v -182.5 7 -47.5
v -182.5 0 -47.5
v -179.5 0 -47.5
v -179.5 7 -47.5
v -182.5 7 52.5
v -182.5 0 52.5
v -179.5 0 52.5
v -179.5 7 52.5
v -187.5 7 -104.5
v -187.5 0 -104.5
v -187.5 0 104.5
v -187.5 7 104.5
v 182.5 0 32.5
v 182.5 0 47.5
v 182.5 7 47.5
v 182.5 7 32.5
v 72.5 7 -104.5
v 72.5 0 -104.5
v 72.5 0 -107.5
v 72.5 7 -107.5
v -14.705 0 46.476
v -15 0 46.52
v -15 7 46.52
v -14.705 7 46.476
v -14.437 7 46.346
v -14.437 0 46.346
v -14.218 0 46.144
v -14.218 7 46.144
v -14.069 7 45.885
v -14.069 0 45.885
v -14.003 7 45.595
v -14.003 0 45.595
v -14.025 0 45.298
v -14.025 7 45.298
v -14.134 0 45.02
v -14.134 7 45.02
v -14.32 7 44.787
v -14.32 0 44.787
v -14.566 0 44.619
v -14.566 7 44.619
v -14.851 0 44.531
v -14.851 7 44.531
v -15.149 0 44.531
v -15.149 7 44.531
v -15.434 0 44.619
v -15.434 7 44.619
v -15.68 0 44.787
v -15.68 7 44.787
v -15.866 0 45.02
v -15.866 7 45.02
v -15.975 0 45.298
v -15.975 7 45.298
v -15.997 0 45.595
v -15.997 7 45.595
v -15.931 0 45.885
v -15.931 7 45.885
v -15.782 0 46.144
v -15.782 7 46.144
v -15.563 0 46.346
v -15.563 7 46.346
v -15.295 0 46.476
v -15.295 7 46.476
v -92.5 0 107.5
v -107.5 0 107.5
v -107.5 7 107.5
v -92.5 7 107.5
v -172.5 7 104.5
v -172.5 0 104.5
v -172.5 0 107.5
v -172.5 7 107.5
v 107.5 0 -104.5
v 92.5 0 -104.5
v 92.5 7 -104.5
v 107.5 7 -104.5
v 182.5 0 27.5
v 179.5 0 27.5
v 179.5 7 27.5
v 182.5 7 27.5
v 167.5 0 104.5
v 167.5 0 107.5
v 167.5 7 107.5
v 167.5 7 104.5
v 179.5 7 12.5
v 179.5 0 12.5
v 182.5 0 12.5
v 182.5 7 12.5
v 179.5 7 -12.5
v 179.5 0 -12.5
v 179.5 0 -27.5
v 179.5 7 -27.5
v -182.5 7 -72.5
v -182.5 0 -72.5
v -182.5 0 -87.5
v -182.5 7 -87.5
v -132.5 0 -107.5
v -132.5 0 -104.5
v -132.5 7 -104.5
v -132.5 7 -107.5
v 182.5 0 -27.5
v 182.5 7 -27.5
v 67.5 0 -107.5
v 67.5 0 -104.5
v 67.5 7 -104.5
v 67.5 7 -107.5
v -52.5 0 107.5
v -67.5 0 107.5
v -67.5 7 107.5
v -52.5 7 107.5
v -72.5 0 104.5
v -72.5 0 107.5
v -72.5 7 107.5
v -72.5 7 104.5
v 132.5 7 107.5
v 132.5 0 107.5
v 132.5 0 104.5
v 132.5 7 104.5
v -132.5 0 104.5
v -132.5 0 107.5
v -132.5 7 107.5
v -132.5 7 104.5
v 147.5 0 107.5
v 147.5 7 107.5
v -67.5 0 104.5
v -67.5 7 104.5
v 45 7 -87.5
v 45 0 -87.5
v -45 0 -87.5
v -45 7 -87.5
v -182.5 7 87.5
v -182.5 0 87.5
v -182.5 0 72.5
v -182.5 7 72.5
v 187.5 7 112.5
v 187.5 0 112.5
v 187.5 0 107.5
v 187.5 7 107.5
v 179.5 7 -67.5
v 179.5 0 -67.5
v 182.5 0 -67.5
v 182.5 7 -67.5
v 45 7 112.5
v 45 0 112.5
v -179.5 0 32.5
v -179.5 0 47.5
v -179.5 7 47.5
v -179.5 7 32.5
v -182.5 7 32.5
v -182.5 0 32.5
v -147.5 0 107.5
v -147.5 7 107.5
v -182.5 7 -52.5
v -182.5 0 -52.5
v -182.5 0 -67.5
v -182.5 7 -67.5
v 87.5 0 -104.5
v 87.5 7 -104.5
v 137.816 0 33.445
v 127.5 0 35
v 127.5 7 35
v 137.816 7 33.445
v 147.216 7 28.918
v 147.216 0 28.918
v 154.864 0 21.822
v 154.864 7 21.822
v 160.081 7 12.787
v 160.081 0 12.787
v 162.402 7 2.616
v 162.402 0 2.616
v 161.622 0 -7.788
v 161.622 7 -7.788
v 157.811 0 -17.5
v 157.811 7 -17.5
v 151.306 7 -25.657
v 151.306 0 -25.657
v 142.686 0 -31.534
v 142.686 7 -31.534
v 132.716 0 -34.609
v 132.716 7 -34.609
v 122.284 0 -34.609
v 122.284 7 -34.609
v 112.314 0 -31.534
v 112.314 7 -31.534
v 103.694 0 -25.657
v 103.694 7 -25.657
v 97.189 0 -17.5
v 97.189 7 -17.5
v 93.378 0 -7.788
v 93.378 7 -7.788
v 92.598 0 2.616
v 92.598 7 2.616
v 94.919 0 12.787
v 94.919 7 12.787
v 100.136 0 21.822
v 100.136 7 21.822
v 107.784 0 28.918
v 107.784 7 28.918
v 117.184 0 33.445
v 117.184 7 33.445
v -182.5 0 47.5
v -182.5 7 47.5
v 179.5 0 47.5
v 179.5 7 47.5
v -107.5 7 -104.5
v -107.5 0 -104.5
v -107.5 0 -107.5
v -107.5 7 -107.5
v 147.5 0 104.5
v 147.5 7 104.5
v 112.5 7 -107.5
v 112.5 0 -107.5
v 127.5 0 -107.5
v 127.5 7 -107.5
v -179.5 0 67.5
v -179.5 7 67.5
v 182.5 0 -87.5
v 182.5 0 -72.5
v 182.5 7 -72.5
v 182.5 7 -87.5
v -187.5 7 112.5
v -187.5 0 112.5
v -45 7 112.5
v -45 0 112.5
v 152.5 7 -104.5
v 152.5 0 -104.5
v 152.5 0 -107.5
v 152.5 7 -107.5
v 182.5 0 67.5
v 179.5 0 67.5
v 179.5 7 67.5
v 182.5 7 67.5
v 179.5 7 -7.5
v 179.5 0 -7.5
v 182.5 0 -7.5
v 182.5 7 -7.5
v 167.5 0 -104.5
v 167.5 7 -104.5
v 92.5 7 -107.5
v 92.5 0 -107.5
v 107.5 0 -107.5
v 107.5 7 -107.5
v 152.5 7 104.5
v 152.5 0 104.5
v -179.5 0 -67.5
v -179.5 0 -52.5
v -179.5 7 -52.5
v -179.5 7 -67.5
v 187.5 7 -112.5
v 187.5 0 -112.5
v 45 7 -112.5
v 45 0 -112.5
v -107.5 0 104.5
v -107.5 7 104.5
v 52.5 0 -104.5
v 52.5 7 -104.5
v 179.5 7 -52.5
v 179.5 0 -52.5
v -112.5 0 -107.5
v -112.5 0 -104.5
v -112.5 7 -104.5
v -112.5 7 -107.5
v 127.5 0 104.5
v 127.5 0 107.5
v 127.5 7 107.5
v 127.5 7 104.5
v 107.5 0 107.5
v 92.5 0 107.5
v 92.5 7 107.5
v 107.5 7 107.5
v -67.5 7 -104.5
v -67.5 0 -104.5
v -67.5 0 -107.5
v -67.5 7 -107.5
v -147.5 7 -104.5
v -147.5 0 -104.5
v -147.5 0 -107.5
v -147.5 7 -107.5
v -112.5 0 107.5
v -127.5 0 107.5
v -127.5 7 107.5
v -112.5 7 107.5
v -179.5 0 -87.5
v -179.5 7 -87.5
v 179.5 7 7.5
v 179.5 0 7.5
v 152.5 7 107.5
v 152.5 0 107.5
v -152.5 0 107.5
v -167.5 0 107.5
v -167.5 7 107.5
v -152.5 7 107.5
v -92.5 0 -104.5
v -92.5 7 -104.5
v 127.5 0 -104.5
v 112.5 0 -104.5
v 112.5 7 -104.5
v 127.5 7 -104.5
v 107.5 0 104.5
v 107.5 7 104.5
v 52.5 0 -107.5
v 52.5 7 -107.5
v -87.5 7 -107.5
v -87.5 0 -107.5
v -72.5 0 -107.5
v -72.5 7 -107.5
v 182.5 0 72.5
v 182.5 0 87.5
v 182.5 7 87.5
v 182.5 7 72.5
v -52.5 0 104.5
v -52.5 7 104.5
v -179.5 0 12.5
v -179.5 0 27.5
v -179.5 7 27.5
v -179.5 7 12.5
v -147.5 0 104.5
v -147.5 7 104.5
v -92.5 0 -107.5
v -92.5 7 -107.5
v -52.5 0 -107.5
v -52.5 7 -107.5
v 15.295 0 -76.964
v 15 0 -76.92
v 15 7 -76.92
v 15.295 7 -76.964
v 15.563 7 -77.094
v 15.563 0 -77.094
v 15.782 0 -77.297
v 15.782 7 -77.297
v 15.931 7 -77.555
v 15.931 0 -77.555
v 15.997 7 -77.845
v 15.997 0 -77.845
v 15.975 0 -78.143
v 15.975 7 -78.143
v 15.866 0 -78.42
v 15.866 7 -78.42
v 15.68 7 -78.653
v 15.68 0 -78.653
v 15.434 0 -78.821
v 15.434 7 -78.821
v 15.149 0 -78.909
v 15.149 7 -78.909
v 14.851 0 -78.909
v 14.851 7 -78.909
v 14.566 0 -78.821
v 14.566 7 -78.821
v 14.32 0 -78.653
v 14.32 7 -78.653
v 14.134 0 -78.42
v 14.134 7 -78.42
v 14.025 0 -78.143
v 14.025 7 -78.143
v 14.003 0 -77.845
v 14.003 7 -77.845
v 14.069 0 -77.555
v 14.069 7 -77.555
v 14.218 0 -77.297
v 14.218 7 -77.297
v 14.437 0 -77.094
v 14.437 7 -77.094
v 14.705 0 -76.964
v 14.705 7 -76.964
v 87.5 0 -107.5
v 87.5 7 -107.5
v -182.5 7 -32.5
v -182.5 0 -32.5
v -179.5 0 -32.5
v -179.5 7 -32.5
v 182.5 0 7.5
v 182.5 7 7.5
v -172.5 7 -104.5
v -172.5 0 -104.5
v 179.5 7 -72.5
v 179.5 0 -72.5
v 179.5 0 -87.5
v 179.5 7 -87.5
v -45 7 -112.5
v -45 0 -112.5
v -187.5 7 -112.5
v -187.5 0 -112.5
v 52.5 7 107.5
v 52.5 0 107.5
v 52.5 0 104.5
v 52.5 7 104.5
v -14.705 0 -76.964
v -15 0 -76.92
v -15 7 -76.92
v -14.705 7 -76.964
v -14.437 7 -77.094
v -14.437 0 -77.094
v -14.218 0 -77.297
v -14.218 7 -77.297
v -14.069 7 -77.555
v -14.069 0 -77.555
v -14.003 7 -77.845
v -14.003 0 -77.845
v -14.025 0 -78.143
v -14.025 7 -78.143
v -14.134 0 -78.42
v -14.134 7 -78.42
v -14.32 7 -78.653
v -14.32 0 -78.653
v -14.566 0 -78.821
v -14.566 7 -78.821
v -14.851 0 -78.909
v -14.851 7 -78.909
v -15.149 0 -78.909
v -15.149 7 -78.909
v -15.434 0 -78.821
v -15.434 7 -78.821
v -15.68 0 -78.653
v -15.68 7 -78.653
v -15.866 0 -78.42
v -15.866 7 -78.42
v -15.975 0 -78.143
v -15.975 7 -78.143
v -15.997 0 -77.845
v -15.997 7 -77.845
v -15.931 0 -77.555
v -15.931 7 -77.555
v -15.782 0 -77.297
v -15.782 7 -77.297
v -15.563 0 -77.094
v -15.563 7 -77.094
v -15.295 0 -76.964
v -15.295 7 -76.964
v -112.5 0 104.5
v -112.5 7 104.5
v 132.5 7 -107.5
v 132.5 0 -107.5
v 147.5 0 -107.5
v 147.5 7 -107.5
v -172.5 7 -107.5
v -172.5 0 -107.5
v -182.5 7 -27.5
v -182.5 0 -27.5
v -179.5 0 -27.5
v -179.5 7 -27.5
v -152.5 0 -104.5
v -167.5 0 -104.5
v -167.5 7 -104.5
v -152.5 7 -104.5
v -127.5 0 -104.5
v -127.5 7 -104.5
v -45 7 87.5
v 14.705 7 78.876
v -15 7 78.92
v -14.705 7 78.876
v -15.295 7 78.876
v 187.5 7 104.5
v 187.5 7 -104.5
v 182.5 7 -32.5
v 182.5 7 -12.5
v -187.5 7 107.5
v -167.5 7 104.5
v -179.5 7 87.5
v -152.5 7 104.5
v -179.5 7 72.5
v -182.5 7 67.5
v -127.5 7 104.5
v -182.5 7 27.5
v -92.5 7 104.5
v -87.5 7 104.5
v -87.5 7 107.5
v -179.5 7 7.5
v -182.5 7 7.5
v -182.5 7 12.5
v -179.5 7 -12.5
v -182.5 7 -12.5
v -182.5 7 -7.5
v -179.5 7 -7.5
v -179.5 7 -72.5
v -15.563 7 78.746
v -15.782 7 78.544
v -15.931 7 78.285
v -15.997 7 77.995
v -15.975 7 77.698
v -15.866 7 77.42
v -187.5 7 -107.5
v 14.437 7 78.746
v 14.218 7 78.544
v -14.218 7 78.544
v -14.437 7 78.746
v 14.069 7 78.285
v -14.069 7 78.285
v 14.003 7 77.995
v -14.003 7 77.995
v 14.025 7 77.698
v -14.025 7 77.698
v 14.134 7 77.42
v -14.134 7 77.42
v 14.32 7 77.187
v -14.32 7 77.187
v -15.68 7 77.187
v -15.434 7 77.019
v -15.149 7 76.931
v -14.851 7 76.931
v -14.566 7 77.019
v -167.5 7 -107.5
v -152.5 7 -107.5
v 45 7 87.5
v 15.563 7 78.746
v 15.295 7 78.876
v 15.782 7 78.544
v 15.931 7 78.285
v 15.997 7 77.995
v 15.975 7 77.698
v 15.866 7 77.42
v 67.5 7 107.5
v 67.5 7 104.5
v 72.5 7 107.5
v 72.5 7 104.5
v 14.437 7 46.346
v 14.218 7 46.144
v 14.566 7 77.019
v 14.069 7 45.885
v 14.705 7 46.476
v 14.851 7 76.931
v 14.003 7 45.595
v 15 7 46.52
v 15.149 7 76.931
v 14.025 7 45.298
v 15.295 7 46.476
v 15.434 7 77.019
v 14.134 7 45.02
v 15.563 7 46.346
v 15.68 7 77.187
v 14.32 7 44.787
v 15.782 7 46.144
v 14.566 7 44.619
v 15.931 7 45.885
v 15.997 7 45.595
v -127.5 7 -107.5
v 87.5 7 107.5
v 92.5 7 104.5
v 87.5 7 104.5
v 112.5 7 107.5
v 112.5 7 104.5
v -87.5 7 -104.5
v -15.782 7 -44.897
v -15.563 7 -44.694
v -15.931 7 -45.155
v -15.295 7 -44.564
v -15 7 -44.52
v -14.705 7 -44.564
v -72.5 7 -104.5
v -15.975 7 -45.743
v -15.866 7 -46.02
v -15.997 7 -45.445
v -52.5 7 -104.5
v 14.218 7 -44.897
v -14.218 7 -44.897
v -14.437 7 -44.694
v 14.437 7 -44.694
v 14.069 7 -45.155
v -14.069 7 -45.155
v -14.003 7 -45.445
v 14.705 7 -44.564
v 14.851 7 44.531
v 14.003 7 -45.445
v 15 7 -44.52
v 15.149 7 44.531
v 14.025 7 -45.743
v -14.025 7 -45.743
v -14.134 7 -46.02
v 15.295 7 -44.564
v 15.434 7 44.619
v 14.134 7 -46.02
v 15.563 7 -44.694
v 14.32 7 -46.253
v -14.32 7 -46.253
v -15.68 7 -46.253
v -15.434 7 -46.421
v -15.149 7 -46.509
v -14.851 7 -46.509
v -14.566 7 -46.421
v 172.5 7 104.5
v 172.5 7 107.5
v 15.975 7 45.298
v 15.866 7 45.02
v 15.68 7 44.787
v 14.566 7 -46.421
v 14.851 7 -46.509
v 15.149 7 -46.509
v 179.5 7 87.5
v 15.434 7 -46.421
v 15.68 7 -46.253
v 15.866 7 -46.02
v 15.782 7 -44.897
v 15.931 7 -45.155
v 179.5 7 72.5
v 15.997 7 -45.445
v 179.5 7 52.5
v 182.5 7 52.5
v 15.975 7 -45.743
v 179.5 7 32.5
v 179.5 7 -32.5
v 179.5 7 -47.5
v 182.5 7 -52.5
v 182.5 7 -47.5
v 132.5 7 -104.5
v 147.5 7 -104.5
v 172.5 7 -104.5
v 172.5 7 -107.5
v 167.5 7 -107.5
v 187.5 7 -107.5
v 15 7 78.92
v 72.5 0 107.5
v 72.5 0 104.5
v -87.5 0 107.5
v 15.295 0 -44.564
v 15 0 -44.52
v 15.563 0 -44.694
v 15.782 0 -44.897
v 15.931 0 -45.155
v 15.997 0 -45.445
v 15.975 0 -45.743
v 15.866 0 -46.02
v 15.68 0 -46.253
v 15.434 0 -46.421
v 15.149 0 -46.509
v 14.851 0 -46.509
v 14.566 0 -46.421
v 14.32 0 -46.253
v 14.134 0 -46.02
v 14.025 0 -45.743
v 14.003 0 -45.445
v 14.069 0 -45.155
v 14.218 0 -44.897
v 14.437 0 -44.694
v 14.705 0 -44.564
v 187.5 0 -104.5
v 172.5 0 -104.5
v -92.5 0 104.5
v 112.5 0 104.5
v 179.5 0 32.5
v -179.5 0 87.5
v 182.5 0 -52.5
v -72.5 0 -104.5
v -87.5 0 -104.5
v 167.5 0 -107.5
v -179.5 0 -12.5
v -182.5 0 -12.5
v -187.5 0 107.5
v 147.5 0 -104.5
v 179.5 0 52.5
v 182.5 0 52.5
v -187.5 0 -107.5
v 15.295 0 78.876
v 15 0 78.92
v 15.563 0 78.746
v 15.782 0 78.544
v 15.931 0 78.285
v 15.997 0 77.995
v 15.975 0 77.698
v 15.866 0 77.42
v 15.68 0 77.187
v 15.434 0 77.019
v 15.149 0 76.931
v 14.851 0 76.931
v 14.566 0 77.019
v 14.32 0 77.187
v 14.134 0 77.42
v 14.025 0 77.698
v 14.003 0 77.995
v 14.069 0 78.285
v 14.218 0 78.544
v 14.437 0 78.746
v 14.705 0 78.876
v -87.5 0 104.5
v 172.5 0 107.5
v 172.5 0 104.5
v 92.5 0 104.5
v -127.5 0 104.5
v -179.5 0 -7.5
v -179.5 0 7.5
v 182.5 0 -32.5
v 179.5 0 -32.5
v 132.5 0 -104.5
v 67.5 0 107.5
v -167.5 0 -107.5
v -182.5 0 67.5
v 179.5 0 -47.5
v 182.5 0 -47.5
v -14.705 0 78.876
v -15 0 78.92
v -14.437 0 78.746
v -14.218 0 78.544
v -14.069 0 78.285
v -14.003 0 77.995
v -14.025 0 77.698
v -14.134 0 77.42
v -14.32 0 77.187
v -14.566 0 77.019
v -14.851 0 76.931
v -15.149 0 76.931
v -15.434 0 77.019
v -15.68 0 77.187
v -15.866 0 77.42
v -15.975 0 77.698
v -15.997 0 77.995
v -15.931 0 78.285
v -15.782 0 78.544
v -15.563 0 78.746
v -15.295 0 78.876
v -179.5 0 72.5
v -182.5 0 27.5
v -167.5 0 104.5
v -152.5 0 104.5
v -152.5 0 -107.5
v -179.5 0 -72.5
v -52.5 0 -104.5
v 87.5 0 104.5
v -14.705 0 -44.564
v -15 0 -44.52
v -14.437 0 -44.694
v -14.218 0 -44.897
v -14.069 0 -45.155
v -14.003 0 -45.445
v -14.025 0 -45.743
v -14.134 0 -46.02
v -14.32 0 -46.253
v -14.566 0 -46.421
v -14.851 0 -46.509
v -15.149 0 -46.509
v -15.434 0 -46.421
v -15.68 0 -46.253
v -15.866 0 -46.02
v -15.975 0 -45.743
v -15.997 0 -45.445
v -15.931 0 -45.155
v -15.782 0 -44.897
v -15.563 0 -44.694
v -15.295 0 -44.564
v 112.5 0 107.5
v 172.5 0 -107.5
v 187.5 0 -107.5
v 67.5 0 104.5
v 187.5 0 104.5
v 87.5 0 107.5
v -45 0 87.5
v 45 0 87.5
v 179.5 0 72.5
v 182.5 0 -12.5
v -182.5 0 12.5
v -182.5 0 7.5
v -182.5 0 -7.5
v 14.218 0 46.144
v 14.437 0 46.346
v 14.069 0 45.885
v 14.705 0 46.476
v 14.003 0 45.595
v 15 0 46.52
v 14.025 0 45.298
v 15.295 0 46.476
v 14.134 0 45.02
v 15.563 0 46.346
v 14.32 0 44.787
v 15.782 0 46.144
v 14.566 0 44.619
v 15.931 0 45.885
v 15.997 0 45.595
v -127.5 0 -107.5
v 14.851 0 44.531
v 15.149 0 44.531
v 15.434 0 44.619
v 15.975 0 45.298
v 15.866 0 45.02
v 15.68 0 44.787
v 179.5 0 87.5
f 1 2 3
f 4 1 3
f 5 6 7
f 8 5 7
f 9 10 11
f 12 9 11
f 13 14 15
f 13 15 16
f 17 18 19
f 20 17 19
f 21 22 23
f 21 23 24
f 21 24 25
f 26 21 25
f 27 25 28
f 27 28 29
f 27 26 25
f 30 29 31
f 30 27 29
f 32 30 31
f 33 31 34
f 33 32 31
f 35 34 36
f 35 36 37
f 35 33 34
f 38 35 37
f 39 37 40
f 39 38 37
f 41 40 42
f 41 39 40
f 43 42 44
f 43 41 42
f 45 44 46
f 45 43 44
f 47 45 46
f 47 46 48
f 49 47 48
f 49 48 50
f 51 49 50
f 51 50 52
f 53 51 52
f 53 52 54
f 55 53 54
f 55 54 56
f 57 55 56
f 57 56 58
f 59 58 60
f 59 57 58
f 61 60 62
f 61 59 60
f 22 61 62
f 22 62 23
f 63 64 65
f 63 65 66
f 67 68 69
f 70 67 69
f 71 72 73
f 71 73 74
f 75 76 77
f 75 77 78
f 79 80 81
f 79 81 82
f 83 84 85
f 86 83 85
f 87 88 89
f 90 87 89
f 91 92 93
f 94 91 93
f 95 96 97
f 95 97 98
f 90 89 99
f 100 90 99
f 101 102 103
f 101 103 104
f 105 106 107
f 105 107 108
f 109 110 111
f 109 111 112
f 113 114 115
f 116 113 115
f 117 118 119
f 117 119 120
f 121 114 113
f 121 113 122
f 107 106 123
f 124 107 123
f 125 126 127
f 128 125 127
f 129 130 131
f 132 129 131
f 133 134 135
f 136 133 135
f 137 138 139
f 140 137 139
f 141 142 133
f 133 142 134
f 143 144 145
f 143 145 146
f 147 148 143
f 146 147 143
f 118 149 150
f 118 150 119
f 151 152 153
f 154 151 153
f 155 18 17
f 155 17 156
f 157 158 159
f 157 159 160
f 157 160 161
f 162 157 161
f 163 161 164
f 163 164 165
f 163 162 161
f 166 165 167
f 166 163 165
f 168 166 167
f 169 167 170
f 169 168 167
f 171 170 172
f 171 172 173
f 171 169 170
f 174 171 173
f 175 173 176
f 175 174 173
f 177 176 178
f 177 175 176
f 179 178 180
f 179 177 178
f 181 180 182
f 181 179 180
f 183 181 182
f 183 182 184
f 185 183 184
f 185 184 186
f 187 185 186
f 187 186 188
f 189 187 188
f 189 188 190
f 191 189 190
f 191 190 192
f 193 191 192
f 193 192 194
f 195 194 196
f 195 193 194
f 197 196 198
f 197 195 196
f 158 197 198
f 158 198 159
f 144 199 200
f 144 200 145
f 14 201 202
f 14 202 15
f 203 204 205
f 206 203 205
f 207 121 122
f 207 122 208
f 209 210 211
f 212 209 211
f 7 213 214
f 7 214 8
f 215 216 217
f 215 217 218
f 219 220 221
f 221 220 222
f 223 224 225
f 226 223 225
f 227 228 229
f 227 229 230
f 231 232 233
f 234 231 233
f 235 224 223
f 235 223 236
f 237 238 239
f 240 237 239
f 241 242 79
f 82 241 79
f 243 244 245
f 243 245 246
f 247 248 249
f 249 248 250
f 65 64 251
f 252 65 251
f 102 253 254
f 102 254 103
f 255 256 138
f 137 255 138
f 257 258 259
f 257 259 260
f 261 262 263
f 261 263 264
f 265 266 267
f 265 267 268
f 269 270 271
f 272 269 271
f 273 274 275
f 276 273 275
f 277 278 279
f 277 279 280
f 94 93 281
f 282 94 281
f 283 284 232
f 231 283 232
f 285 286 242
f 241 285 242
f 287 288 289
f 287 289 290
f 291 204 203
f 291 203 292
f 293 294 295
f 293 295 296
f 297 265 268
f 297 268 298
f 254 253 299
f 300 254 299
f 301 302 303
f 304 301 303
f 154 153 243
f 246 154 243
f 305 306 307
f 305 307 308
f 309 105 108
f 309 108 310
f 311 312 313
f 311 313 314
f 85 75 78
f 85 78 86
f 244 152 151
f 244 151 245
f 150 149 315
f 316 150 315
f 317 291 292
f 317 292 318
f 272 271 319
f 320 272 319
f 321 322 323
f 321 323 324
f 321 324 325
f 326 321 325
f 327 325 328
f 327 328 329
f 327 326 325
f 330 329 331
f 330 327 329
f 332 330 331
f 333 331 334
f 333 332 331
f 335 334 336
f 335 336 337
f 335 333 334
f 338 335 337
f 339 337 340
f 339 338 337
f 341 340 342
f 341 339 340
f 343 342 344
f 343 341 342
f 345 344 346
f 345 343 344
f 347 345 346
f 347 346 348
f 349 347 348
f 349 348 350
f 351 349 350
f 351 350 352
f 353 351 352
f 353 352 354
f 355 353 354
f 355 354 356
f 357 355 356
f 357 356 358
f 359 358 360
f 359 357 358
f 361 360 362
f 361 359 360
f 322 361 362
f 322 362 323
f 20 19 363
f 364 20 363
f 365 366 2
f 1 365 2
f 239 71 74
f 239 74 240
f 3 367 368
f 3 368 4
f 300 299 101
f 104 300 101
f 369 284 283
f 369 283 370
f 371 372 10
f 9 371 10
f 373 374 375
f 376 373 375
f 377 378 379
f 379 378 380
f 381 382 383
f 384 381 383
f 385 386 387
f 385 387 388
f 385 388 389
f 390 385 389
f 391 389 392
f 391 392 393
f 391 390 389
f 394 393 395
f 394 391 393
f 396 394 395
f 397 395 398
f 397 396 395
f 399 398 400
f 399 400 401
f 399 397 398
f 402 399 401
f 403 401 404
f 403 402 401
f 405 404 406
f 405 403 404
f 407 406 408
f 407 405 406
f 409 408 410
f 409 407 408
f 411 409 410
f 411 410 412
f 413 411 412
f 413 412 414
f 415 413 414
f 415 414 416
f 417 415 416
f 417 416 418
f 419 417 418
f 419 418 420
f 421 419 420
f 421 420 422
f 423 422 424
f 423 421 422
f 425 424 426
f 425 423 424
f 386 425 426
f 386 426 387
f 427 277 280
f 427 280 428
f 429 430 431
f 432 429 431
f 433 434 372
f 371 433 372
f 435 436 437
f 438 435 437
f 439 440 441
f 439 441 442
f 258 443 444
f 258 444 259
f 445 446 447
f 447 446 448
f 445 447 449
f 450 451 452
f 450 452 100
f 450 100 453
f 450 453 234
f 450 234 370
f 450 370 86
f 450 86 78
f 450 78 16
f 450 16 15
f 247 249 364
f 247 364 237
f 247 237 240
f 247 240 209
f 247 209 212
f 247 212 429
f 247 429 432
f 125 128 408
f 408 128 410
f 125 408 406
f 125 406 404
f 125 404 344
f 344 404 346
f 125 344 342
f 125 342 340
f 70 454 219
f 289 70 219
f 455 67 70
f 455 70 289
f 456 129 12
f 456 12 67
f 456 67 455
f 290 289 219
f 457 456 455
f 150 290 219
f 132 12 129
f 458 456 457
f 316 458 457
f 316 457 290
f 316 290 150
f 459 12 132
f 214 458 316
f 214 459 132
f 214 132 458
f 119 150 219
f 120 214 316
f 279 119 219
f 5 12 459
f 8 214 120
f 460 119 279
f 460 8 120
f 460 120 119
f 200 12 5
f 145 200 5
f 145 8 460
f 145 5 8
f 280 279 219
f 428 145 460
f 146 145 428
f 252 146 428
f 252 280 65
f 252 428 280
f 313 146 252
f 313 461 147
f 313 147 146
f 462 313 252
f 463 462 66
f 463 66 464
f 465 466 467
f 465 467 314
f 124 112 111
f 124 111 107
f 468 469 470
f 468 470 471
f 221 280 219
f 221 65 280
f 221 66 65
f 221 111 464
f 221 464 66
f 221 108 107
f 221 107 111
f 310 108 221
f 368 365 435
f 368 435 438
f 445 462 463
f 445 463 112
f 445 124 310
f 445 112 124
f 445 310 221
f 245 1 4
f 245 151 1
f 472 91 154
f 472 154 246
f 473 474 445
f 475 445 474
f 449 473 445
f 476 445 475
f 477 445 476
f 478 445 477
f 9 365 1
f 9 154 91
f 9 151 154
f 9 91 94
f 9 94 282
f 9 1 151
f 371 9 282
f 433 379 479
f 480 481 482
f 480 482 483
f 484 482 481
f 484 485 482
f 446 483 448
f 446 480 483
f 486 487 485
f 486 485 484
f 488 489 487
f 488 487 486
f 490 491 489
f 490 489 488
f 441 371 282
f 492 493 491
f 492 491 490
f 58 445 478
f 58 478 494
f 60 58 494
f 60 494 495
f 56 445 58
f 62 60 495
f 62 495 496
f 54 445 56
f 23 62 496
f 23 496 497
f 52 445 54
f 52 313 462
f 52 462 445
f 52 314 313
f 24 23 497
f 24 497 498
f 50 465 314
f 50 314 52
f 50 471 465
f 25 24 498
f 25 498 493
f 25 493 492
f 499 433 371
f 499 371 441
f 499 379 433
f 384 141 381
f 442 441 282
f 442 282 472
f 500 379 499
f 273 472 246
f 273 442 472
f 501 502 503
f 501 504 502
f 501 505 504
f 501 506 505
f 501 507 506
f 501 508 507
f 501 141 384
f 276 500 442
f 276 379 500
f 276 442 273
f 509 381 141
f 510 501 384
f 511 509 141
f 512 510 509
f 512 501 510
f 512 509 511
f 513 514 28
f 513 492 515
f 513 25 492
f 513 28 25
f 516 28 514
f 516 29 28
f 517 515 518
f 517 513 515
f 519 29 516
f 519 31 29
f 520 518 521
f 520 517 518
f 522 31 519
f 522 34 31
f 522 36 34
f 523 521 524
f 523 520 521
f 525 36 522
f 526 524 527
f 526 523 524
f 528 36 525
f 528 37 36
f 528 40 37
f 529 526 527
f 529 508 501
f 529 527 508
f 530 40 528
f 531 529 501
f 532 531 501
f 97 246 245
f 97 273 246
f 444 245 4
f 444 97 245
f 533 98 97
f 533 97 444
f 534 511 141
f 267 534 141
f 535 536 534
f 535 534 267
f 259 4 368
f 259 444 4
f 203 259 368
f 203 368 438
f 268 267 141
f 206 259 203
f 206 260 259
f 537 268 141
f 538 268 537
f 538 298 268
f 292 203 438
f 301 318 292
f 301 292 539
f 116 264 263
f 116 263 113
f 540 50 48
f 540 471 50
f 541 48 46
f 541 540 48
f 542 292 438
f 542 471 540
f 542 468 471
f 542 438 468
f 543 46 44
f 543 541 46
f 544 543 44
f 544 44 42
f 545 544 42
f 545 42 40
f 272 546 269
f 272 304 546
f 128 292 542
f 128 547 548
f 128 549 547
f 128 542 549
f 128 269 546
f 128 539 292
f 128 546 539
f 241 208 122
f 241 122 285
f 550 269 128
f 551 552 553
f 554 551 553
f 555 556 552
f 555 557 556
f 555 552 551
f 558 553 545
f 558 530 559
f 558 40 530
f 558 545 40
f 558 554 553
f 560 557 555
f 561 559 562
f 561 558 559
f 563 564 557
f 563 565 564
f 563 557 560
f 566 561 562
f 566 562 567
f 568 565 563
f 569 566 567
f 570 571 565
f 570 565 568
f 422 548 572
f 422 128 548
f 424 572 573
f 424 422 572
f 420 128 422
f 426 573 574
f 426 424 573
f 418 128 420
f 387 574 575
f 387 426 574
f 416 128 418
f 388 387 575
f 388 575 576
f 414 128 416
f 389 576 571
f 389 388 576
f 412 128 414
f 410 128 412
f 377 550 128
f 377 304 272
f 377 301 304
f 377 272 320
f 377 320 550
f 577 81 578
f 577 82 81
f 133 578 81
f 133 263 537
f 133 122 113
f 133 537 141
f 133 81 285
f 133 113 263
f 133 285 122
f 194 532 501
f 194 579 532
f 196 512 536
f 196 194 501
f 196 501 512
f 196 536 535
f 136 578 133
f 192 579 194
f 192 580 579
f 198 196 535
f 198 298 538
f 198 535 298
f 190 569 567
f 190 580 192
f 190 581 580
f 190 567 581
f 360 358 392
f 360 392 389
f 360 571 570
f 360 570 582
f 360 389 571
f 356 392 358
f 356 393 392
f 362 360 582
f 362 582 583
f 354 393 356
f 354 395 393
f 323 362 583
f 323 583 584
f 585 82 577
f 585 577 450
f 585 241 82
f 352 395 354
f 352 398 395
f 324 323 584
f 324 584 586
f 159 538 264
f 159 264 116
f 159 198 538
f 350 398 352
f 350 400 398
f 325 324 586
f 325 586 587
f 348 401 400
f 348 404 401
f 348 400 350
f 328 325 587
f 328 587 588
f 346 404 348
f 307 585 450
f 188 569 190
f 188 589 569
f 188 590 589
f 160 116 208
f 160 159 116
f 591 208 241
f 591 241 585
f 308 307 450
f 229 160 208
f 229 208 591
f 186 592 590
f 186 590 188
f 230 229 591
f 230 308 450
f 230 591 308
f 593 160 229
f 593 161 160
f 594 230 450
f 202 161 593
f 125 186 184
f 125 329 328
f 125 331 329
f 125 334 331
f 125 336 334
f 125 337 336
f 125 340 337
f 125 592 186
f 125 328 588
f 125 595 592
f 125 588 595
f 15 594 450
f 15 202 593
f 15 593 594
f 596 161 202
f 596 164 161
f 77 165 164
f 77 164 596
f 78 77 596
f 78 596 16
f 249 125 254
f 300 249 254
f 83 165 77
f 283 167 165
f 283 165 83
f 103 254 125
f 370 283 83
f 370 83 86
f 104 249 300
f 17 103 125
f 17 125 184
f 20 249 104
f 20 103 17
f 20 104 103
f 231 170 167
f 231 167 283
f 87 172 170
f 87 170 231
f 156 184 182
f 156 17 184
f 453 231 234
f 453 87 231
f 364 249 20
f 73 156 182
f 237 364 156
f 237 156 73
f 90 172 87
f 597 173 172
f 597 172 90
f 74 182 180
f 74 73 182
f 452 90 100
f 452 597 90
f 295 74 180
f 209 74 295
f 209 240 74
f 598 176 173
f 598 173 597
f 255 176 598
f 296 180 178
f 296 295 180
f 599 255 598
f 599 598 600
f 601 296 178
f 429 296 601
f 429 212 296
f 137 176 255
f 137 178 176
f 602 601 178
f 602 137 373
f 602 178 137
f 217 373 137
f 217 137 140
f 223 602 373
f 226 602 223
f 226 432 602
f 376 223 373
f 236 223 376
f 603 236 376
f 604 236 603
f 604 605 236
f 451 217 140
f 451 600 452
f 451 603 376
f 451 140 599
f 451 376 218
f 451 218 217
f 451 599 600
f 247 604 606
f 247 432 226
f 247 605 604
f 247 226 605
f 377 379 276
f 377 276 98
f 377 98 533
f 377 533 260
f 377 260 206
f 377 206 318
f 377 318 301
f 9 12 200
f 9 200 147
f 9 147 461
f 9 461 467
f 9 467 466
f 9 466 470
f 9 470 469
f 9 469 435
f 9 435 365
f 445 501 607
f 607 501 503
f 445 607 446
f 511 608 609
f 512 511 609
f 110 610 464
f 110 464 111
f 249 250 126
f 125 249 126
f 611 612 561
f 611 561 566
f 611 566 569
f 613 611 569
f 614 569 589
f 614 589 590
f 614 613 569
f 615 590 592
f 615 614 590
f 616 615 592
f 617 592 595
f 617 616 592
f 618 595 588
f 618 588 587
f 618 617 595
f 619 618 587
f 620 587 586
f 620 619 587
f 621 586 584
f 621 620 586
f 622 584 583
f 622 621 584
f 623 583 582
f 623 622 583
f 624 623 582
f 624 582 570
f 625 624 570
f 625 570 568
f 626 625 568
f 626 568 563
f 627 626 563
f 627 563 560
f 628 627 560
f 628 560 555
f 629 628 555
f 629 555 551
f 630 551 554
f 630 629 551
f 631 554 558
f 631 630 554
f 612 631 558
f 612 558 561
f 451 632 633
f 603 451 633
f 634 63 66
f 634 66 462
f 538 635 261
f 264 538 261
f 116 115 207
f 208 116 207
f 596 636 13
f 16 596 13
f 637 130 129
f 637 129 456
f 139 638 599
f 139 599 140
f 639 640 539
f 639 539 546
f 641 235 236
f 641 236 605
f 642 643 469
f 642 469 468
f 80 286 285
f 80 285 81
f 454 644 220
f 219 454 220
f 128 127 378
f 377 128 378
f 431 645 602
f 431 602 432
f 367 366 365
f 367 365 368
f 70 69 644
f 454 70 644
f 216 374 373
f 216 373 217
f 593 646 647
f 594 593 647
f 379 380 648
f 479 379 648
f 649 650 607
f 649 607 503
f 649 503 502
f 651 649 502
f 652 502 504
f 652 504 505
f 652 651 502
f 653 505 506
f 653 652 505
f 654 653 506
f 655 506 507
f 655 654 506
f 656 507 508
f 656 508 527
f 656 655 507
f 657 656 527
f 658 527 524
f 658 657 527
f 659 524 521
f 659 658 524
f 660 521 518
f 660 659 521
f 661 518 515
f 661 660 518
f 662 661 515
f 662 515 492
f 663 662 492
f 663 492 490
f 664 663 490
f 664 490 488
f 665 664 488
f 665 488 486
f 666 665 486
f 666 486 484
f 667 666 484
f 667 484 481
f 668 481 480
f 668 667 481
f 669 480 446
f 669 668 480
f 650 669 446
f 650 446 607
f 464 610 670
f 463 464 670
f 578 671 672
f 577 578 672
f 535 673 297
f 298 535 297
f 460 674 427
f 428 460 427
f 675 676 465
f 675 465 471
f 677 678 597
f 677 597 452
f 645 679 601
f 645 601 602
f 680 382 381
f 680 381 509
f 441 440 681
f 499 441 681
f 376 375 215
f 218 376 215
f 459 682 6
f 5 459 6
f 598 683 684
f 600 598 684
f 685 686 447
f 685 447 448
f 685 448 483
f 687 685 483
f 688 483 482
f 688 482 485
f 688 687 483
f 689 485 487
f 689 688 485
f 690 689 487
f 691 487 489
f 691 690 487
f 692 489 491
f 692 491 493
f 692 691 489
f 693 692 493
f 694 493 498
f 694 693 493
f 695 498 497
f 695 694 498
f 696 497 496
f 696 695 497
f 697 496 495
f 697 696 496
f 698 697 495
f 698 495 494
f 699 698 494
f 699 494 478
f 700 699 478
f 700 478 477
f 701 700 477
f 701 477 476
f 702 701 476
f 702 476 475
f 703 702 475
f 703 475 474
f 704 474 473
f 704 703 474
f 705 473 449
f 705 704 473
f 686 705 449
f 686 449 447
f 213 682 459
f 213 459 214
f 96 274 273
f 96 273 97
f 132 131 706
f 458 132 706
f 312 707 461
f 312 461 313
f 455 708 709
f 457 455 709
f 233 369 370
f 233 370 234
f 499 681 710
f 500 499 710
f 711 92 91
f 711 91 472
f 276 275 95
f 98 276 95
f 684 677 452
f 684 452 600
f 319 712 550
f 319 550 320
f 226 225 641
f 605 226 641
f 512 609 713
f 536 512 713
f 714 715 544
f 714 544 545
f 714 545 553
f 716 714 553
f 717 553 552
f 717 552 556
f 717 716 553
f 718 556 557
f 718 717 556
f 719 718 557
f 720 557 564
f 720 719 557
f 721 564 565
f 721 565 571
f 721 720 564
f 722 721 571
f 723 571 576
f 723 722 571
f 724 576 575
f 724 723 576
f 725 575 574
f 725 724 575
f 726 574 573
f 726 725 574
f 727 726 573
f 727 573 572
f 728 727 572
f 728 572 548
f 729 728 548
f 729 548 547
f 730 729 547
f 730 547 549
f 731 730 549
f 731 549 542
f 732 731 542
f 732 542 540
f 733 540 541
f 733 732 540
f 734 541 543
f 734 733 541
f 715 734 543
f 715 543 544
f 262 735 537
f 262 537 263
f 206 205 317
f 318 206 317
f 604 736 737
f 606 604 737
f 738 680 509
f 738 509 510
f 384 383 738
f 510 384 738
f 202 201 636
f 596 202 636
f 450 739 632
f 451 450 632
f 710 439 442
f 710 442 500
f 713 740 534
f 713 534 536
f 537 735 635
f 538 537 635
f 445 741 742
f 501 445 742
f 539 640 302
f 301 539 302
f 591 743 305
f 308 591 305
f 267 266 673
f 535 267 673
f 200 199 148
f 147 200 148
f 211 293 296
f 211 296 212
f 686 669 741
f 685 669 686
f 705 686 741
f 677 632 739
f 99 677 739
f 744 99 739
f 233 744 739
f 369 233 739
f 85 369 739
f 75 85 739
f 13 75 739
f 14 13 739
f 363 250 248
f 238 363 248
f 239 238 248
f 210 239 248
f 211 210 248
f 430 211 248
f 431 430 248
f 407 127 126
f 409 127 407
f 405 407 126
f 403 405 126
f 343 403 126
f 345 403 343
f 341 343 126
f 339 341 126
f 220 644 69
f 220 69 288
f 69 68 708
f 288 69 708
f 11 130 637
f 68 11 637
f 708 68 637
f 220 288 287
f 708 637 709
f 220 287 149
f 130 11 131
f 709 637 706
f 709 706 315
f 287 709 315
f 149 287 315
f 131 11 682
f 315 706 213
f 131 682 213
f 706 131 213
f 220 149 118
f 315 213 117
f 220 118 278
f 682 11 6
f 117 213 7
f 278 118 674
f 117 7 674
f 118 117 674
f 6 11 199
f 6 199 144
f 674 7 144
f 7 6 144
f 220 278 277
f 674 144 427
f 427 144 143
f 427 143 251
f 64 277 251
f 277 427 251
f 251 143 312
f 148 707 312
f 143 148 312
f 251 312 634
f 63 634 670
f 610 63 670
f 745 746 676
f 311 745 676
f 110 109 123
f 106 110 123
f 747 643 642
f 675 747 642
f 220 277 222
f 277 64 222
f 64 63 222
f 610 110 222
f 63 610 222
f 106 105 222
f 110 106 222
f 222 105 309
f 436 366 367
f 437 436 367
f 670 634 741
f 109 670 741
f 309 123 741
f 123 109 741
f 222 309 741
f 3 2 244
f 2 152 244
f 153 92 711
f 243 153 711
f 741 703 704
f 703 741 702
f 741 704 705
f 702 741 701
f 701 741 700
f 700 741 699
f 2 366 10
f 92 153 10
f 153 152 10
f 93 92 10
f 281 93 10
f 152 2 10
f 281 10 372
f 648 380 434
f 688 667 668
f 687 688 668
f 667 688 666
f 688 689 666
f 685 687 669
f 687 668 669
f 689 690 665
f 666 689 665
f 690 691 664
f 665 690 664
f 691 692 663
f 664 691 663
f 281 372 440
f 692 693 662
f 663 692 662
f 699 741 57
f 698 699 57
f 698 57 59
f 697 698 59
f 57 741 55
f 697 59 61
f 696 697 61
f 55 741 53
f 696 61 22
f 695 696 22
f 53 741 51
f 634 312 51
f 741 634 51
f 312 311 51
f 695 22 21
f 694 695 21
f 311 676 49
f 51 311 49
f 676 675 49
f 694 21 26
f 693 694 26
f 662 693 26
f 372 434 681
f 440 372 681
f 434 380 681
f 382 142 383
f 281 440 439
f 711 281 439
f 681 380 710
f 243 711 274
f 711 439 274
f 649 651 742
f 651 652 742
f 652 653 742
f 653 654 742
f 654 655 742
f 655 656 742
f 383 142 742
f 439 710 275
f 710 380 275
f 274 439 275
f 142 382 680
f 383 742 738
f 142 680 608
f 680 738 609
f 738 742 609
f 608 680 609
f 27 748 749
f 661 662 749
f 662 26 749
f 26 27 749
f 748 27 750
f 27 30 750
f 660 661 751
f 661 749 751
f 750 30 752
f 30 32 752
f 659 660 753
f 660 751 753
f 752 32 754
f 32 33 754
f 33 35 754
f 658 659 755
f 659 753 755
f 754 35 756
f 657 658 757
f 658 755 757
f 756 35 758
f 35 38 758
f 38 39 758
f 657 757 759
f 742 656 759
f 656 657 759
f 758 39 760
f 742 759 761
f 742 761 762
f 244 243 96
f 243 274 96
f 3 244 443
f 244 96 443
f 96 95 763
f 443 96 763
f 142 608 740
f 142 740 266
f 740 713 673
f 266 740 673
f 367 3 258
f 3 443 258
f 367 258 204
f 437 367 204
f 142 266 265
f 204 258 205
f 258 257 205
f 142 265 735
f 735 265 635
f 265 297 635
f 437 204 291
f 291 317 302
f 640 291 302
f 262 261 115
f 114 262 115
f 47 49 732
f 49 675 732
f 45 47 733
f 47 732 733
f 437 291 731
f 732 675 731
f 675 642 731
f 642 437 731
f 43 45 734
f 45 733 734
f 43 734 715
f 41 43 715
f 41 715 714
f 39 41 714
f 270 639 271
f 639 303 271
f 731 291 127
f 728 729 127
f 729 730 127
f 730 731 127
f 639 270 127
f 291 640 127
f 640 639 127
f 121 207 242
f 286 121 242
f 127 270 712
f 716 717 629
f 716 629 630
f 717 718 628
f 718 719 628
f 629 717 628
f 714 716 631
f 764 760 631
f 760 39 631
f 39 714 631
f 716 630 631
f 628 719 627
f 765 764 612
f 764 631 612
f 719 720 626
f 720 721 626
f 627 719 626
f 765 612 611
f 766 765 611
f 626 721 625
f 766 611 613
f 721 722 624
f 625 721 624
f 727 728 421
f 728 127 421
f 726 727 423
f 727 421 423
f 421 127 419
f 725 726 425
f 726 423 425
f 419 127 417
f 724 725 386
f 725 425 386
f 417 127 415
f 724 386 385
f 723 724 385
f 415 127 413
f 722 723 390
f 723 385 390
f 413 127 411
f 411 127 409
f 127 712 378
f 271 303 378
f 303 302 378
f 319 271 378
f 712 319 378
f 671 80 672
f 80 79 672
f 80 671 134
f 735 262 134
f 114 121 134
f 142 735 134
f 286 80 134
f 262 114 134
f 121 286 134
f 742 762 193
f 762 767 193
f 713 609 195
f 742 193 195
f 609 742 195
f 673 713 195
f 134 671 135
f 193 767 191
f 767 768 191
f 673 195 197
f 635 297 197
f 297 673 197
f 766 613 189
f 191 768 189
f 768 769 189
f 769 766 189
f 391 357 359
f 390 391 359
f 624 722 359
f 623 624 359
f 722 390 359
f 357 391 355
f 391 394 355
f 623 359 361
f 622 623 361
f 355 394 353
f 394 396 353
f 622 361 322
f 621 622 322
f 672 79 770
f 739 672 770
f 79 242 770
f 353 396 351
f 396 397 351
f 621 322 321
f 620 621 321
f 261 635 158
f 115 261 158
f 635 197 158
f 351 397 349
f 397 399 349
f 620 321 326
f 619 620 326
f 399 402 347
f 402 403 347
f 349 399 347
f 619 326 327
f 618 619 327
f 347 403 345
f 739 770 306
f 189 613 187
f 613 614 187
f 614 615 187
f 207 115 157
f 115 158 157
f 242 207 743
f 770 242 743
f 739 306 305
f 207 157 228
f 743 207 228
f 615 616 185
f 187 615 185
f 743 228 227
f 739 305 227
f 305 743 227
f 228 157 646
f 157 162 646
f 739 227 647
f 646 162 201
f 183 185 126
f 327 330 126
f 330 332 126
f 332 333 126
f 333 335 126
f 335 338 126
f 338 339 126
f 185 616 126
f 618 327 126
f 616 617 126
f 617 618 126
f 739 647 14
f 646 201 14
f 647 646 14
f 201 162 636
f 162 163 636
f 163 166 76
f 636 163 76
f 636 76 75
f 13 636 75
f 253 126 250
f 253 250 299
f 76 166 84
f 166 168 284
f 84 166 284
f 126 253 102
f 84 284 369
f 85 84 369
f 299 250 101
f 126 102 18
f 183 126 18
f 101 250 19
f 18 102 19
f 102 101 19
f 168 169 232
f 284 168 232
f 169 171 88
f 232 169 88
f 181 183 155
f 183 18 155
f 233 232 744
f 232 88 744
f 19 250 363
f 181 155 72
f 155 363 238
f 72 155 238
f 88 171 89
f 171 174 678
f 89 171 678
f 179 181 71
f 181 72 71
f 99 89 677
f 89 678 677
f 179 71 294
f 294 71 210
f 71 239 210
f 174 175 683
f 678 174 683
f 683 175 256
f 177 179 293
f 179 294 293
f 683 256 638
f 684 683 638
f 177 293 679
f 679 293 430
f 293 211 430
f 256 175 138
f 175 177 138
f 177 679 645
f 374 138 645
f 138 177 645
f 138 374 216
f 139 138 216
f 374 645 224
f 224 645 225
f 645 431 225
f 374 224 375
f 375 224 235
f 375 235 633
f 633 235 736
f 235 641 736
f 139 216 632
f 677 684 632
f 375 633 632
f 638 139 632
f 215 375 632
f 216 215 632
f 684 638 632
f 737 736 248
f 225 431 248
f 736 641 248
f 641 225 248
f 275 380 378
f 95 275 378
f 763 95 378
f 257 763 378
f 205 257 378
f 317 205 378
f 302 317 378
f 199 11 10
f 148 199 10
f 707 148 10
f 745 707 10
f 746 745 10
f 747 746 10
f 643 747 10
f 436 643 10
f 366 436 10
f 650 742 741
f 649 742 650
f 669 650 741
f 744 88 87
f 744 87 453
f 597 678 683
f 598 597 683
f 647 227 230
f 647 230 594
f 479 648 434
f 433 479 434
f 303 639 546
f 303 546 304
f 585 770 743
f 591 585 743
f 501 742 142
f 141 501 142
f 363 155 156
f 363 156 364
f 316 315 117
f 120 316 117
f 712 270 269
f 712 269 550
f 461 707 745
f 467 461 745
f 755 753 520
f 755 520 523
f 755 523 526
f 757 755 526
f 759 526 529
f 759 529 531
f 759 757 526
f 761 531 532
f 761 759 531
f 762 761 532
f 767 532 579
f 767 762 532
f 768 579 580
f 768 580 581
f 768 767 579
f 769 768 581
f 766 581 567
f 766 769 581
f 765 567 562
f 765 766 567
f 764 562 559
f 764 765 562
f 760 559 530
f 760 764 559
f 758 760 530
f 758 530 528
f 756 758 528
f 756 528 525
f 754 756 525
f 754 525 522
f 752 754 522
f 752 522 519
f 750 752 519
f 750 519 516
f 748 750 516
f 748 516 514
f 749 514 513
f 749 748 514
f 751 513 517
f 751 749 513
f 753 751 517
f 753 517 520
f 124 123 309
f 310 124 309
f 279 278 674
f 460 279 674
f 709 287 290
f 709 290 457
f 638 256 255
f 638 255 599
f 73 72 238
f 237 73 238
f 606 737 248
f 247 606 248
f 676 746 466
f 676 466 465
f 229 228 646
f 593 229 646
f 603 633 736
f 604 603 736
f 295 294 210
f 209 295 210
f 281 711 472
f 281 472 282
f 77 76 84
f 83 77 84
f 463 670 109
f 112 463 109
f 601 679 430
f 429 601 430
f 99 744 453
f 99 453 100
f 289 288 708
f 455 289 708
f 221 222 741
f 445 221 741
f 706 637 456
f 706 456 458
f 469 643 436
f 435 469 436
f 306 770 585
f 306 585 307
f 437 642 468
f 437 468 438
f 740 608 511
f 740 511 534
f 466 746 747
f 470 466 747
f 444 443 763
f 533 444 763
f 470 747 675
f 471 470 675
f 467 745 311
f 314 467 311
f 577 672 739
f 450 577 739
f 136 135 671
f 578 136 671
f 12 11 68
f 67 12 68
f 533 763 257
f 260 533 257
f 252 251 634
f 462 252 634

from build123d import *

# Parameters (mm, degrees)
SKETCH6_W           = 15
SKETCH6_H           = 3
SKETCH6_W_2         = 3
SKETCH6_H_2         = 15
SKETCH6_R           = 1
SKETCH6_R_2         = 35
BOSS_EXTRUDE3_DEPTH = 7


with BuildPart() as part:
    # Sketch6 → Boss-Extrude3 (new body)
    with BuildSketch(Plane(origin=(0, 0, 0), x_dir=(1, 0, 0), z_dir=(0, 1, 0))):
        Polygon((-45, 112.5), (-187.5, 112.5), (-187.5, 107.5), (-172.5, 107.5), (-172.5, 104.5), (-187.5, 104.5), (-187.5, -104.5), (-172.5, -104.5), (-172.5, -107.5), (-187.5, -107.5), (-187.5, -112.5), (-45, -112.5), (-45, -87.5), (45, -87.5), (45, -112.5), (187.5, -112.5), (187.5, -107.5), (172.5, -107.5), (172.5, -104.5), (187.5, -104.5), (187.5, 104.5), (172.5, 104.5), (172.5, 107.5), (187.5, 107.5), (187.5, 112.5), (45, 112.5), (45, 87.5), (-45, 87.5), align=None)
        with Locations((-160, -106)):
            Rectangle(SKETCH6_W, SKETCH6_H, mode=Mode.SUBTRACT)
        with Locations((-140, -106)):
            Rectangle(SKETCH6_W, SKETCH6_H, mode=Mode.SUBTRACT)
        with Locations((-120, -106)):
            Rectangle(SKETCH6_W, SKETCH6_H, mode=Mode.SUBTRACT)
        with Locations((-100, -106)):
            Rectangle(SKETCH6_W, SKETCH6_H, mode=Mode.SUBTRACT)
        with Locations((-181, -80)):
            Rectangle(SKETCH6_W_2, SKETCH6_H_2, mode=Mode.SUBTRACT)
        with Locations((-181, -60)):
            Rectangle(SKETCH6_W_2, SKETCH6_H_2, mode=Mode.SUBTRACT)
        with Locations((-80, -106)):
            Rectangle(SKETCH6_W, SKETCH6_H, mode=Mode.SUBTRACT)
        with Locations((-60, -106)):
            Rectangle(SKETCH6_W, SKETCH6_H, mode=Mode.SUBTRACT)
        with Locations(Location((-15, -77.920021532, 0), (0, 0, 270))):
            Circle(SKETCH6_R, mode=Mode.SUBTRACT)
        with Locations((-181, -40)):
            Rectangle(SKETCH6_W_2, SKETCH6_H_2, mode=Mode.SUBTRACT)
        with Locations((-181, -20)):
            Rectangle(SKETCH6_W_2, SKETCH6_H_2, mode=Mode.SUBTRACT)
        with Locations(Location((-15, -45.520021532, 0), (0, 0, 270))):
            Circle(SKETCH6_R, mode=Mode.SUBTRACT)
        with Locations((60, -106)):
            Rectangle(SKETCH6_W, SKETCH6_H, mode=Mode.SUBTRACT)
        with Locations((80, -106)):
            Rectangle(SKETCH6_W, SKETCH6_H, mode=Mode.SUBTRACT)
        with Locations(Location((15, -77.920021532, 0), (0, 0, 270))):
            Circle(SKETCH6_R, mode=Mode.SUBTRACT)
        with Locations((100, -106)):
            Rectangle(SKETCH6_W, SKETCH6_H, mode=Mode.SUBTRACT)
        with Locations((120, -106)):
            Rectangle(SKETCH6_W, SKETCH6_H, mode=Mode.SUBTRACT)
        with Locations((140, -106)):
            Rectangle(SKETCH6_W, SKETCH6_H, mode=Mode.SUBTRACT)
        with Locations((160, -106)):
            Rectangle(SKETCH6_W, SKETCH6_H, mode=Mode.SUBTRACT)
        with Locations((181, -80)):
            Rectangle(SKETCH6_W_2, SKETCH6_H_2, mode=Mode.SUBTRACT)
        with Locations((181, -60)):
            Rectangle(SKETCH6_W_2, SKETCH6_H_2, mode=Mode.SUBTRACT)
        with Locations(Location((15, -45.520021532, 0), (0, 0, 270))):
            Circle(SKETCH6_R, mode=Mode.SUBTRACT)
        with Locations((181, -40)):
            Rectangle(SKETCH6_W_2, SKETCH6_H_2, mode=Mode.SUBTRACT)
        with Locations((181, -20)):
            Rectangle(SKETCH6_W_2, SKETCH6_H_2, mode=Mode.SUBTRACT)
        with Locations((-181, 0)):
            Rectangle(SKETCH6_W_2, SKETCH6_H_2, mode=Mode.SUBTRACT)
        with Locations((-181, 20)):
            Rectangle(SKETCH6_W_2, SKETCH6_H_2, mode=Mode.SUBTRACT)
        with Locations((-181, 40)):
            Rectangle(SKETCH6_W_2, SKETCH6_H_2, mode=Mode.SUBTRACT)
        with Locations(Location((-15, 45.520021532, 0), (0, 0, 270))):
            Circle(SKETCH6_R, mode=Mode.SUBTRACT)
        with Locations((-181, 60)):
            Rectangle(SKETCH6_W_2, SKETCH6_H_2, mode=Mode.SUBTRACT)
        with Locations((-181, 80)):
            Rectangle(SKETCH6_W_2, SKETCH6_H_2, mode=Mode.SUBTRACT)
        with Locations((-160, 106)):
            Rectangle(SKETCH6_W, SKETCH6_H, mode=Mode.SUBTRACT)
        with Locations((-140, 106)):
            Rectangle(SKETCH6_W, SKETCH6_H, mode=Mode.SUBTRACT)
        with Locations((-120, 106)):
            Rectangle(SKETCH6_W, SKETCH6_H, mode=Mode.SUBTRACT)
        with Locations((-100, 106)):
            Rectangle(SKETCH6_W, SKETCH6_H, mode=Mode.SUBTRACT)
        with Locations(Location((-15, 77.920021532, 0), (0, 0, 270))):
            Circle(SKETCH6_R, mode=Mode.SUBTRACT)
        with Locations((-80, 106)):
            Rectangle(SKETCH6_W, SKETCH6_H, mode=Mode.SUBTRACT)
        with Locations((-60, 106)):
            Rectangle(SKETCH6_W, SKETCH6_H, mode=Mode.SUBTRACT)
        with Locations(Location((15, 45.520021532, 0), (0, 0, 270))):
            Circle(SKETCH6_R, mode=Mode.SUBTRACT)
        with Locations(Location((127.5, 0, 0), (0, 0, 270))):
            Circle(SKETCH6_R_2, mode=Mode.SUBTRACT)
        with Locations((181, 0)):
            Rectangle(SKETCH6_W_2, SKETCH6_H_2, mode=Mode.SUBTRACT)
        with Locations((181, 20)):
            Rectangle(SKETCH6_W_2, SKETCH6_H_2, mode=Mode.SUBTRACT)
        with Locations((181, 40)):
            Rectangle(SKETCH6_W_2, SKETCH6_H_2, mode=Mode.SUBTRACT)
        with Locations(Location((15, 77.920021532, 0), (0, 0, 270))):
            Circle(SKETCH6_R, mode=Mode.SUBTRACT)
        with Locations((60, 106)):
            Rectangle(SKETCH6_W, SKETCH6_H, mode=Mode.SUBTRACT)
        with Locations((80, 106)):
            Rectangle(SKETCH6_W, SKETCH6_H, mode=Mode.SUBTRACT)
        with Locations((181, 60)):
            Rectangle(SKETCH6_W_2, SKETCH6_H_2, mode=Mode.SUBTRACT)
        with Locations((181, 80)):
            Rectangle(SKETCH6_W_2, SKETCH6_H_2, mode=Mode.SUBTRACT)
        with Locations((100, 106)):
            Rectangle(SKETCH6_W, SKETCH6_H, mode=Mode.SUBTRACT)
        with Locations((120, 106)):
            Rectangle(SKETCH6_W, SKETCH6_H, mode=Mode.SUBTRACT)
        with Locations((140, 106)):
            Rectangle(SKETCH6_W, SKETCH6_H, mode=Mode.SUBTRACT)
        with Locations((160, 106)):
            Rectangle(SKETCH6_W, SKETCH6_H, mode=Mode.SUBTRACT)
    extrude(amount=BOSS_EXTRUDE3_DEPTH)


solid = part.part
